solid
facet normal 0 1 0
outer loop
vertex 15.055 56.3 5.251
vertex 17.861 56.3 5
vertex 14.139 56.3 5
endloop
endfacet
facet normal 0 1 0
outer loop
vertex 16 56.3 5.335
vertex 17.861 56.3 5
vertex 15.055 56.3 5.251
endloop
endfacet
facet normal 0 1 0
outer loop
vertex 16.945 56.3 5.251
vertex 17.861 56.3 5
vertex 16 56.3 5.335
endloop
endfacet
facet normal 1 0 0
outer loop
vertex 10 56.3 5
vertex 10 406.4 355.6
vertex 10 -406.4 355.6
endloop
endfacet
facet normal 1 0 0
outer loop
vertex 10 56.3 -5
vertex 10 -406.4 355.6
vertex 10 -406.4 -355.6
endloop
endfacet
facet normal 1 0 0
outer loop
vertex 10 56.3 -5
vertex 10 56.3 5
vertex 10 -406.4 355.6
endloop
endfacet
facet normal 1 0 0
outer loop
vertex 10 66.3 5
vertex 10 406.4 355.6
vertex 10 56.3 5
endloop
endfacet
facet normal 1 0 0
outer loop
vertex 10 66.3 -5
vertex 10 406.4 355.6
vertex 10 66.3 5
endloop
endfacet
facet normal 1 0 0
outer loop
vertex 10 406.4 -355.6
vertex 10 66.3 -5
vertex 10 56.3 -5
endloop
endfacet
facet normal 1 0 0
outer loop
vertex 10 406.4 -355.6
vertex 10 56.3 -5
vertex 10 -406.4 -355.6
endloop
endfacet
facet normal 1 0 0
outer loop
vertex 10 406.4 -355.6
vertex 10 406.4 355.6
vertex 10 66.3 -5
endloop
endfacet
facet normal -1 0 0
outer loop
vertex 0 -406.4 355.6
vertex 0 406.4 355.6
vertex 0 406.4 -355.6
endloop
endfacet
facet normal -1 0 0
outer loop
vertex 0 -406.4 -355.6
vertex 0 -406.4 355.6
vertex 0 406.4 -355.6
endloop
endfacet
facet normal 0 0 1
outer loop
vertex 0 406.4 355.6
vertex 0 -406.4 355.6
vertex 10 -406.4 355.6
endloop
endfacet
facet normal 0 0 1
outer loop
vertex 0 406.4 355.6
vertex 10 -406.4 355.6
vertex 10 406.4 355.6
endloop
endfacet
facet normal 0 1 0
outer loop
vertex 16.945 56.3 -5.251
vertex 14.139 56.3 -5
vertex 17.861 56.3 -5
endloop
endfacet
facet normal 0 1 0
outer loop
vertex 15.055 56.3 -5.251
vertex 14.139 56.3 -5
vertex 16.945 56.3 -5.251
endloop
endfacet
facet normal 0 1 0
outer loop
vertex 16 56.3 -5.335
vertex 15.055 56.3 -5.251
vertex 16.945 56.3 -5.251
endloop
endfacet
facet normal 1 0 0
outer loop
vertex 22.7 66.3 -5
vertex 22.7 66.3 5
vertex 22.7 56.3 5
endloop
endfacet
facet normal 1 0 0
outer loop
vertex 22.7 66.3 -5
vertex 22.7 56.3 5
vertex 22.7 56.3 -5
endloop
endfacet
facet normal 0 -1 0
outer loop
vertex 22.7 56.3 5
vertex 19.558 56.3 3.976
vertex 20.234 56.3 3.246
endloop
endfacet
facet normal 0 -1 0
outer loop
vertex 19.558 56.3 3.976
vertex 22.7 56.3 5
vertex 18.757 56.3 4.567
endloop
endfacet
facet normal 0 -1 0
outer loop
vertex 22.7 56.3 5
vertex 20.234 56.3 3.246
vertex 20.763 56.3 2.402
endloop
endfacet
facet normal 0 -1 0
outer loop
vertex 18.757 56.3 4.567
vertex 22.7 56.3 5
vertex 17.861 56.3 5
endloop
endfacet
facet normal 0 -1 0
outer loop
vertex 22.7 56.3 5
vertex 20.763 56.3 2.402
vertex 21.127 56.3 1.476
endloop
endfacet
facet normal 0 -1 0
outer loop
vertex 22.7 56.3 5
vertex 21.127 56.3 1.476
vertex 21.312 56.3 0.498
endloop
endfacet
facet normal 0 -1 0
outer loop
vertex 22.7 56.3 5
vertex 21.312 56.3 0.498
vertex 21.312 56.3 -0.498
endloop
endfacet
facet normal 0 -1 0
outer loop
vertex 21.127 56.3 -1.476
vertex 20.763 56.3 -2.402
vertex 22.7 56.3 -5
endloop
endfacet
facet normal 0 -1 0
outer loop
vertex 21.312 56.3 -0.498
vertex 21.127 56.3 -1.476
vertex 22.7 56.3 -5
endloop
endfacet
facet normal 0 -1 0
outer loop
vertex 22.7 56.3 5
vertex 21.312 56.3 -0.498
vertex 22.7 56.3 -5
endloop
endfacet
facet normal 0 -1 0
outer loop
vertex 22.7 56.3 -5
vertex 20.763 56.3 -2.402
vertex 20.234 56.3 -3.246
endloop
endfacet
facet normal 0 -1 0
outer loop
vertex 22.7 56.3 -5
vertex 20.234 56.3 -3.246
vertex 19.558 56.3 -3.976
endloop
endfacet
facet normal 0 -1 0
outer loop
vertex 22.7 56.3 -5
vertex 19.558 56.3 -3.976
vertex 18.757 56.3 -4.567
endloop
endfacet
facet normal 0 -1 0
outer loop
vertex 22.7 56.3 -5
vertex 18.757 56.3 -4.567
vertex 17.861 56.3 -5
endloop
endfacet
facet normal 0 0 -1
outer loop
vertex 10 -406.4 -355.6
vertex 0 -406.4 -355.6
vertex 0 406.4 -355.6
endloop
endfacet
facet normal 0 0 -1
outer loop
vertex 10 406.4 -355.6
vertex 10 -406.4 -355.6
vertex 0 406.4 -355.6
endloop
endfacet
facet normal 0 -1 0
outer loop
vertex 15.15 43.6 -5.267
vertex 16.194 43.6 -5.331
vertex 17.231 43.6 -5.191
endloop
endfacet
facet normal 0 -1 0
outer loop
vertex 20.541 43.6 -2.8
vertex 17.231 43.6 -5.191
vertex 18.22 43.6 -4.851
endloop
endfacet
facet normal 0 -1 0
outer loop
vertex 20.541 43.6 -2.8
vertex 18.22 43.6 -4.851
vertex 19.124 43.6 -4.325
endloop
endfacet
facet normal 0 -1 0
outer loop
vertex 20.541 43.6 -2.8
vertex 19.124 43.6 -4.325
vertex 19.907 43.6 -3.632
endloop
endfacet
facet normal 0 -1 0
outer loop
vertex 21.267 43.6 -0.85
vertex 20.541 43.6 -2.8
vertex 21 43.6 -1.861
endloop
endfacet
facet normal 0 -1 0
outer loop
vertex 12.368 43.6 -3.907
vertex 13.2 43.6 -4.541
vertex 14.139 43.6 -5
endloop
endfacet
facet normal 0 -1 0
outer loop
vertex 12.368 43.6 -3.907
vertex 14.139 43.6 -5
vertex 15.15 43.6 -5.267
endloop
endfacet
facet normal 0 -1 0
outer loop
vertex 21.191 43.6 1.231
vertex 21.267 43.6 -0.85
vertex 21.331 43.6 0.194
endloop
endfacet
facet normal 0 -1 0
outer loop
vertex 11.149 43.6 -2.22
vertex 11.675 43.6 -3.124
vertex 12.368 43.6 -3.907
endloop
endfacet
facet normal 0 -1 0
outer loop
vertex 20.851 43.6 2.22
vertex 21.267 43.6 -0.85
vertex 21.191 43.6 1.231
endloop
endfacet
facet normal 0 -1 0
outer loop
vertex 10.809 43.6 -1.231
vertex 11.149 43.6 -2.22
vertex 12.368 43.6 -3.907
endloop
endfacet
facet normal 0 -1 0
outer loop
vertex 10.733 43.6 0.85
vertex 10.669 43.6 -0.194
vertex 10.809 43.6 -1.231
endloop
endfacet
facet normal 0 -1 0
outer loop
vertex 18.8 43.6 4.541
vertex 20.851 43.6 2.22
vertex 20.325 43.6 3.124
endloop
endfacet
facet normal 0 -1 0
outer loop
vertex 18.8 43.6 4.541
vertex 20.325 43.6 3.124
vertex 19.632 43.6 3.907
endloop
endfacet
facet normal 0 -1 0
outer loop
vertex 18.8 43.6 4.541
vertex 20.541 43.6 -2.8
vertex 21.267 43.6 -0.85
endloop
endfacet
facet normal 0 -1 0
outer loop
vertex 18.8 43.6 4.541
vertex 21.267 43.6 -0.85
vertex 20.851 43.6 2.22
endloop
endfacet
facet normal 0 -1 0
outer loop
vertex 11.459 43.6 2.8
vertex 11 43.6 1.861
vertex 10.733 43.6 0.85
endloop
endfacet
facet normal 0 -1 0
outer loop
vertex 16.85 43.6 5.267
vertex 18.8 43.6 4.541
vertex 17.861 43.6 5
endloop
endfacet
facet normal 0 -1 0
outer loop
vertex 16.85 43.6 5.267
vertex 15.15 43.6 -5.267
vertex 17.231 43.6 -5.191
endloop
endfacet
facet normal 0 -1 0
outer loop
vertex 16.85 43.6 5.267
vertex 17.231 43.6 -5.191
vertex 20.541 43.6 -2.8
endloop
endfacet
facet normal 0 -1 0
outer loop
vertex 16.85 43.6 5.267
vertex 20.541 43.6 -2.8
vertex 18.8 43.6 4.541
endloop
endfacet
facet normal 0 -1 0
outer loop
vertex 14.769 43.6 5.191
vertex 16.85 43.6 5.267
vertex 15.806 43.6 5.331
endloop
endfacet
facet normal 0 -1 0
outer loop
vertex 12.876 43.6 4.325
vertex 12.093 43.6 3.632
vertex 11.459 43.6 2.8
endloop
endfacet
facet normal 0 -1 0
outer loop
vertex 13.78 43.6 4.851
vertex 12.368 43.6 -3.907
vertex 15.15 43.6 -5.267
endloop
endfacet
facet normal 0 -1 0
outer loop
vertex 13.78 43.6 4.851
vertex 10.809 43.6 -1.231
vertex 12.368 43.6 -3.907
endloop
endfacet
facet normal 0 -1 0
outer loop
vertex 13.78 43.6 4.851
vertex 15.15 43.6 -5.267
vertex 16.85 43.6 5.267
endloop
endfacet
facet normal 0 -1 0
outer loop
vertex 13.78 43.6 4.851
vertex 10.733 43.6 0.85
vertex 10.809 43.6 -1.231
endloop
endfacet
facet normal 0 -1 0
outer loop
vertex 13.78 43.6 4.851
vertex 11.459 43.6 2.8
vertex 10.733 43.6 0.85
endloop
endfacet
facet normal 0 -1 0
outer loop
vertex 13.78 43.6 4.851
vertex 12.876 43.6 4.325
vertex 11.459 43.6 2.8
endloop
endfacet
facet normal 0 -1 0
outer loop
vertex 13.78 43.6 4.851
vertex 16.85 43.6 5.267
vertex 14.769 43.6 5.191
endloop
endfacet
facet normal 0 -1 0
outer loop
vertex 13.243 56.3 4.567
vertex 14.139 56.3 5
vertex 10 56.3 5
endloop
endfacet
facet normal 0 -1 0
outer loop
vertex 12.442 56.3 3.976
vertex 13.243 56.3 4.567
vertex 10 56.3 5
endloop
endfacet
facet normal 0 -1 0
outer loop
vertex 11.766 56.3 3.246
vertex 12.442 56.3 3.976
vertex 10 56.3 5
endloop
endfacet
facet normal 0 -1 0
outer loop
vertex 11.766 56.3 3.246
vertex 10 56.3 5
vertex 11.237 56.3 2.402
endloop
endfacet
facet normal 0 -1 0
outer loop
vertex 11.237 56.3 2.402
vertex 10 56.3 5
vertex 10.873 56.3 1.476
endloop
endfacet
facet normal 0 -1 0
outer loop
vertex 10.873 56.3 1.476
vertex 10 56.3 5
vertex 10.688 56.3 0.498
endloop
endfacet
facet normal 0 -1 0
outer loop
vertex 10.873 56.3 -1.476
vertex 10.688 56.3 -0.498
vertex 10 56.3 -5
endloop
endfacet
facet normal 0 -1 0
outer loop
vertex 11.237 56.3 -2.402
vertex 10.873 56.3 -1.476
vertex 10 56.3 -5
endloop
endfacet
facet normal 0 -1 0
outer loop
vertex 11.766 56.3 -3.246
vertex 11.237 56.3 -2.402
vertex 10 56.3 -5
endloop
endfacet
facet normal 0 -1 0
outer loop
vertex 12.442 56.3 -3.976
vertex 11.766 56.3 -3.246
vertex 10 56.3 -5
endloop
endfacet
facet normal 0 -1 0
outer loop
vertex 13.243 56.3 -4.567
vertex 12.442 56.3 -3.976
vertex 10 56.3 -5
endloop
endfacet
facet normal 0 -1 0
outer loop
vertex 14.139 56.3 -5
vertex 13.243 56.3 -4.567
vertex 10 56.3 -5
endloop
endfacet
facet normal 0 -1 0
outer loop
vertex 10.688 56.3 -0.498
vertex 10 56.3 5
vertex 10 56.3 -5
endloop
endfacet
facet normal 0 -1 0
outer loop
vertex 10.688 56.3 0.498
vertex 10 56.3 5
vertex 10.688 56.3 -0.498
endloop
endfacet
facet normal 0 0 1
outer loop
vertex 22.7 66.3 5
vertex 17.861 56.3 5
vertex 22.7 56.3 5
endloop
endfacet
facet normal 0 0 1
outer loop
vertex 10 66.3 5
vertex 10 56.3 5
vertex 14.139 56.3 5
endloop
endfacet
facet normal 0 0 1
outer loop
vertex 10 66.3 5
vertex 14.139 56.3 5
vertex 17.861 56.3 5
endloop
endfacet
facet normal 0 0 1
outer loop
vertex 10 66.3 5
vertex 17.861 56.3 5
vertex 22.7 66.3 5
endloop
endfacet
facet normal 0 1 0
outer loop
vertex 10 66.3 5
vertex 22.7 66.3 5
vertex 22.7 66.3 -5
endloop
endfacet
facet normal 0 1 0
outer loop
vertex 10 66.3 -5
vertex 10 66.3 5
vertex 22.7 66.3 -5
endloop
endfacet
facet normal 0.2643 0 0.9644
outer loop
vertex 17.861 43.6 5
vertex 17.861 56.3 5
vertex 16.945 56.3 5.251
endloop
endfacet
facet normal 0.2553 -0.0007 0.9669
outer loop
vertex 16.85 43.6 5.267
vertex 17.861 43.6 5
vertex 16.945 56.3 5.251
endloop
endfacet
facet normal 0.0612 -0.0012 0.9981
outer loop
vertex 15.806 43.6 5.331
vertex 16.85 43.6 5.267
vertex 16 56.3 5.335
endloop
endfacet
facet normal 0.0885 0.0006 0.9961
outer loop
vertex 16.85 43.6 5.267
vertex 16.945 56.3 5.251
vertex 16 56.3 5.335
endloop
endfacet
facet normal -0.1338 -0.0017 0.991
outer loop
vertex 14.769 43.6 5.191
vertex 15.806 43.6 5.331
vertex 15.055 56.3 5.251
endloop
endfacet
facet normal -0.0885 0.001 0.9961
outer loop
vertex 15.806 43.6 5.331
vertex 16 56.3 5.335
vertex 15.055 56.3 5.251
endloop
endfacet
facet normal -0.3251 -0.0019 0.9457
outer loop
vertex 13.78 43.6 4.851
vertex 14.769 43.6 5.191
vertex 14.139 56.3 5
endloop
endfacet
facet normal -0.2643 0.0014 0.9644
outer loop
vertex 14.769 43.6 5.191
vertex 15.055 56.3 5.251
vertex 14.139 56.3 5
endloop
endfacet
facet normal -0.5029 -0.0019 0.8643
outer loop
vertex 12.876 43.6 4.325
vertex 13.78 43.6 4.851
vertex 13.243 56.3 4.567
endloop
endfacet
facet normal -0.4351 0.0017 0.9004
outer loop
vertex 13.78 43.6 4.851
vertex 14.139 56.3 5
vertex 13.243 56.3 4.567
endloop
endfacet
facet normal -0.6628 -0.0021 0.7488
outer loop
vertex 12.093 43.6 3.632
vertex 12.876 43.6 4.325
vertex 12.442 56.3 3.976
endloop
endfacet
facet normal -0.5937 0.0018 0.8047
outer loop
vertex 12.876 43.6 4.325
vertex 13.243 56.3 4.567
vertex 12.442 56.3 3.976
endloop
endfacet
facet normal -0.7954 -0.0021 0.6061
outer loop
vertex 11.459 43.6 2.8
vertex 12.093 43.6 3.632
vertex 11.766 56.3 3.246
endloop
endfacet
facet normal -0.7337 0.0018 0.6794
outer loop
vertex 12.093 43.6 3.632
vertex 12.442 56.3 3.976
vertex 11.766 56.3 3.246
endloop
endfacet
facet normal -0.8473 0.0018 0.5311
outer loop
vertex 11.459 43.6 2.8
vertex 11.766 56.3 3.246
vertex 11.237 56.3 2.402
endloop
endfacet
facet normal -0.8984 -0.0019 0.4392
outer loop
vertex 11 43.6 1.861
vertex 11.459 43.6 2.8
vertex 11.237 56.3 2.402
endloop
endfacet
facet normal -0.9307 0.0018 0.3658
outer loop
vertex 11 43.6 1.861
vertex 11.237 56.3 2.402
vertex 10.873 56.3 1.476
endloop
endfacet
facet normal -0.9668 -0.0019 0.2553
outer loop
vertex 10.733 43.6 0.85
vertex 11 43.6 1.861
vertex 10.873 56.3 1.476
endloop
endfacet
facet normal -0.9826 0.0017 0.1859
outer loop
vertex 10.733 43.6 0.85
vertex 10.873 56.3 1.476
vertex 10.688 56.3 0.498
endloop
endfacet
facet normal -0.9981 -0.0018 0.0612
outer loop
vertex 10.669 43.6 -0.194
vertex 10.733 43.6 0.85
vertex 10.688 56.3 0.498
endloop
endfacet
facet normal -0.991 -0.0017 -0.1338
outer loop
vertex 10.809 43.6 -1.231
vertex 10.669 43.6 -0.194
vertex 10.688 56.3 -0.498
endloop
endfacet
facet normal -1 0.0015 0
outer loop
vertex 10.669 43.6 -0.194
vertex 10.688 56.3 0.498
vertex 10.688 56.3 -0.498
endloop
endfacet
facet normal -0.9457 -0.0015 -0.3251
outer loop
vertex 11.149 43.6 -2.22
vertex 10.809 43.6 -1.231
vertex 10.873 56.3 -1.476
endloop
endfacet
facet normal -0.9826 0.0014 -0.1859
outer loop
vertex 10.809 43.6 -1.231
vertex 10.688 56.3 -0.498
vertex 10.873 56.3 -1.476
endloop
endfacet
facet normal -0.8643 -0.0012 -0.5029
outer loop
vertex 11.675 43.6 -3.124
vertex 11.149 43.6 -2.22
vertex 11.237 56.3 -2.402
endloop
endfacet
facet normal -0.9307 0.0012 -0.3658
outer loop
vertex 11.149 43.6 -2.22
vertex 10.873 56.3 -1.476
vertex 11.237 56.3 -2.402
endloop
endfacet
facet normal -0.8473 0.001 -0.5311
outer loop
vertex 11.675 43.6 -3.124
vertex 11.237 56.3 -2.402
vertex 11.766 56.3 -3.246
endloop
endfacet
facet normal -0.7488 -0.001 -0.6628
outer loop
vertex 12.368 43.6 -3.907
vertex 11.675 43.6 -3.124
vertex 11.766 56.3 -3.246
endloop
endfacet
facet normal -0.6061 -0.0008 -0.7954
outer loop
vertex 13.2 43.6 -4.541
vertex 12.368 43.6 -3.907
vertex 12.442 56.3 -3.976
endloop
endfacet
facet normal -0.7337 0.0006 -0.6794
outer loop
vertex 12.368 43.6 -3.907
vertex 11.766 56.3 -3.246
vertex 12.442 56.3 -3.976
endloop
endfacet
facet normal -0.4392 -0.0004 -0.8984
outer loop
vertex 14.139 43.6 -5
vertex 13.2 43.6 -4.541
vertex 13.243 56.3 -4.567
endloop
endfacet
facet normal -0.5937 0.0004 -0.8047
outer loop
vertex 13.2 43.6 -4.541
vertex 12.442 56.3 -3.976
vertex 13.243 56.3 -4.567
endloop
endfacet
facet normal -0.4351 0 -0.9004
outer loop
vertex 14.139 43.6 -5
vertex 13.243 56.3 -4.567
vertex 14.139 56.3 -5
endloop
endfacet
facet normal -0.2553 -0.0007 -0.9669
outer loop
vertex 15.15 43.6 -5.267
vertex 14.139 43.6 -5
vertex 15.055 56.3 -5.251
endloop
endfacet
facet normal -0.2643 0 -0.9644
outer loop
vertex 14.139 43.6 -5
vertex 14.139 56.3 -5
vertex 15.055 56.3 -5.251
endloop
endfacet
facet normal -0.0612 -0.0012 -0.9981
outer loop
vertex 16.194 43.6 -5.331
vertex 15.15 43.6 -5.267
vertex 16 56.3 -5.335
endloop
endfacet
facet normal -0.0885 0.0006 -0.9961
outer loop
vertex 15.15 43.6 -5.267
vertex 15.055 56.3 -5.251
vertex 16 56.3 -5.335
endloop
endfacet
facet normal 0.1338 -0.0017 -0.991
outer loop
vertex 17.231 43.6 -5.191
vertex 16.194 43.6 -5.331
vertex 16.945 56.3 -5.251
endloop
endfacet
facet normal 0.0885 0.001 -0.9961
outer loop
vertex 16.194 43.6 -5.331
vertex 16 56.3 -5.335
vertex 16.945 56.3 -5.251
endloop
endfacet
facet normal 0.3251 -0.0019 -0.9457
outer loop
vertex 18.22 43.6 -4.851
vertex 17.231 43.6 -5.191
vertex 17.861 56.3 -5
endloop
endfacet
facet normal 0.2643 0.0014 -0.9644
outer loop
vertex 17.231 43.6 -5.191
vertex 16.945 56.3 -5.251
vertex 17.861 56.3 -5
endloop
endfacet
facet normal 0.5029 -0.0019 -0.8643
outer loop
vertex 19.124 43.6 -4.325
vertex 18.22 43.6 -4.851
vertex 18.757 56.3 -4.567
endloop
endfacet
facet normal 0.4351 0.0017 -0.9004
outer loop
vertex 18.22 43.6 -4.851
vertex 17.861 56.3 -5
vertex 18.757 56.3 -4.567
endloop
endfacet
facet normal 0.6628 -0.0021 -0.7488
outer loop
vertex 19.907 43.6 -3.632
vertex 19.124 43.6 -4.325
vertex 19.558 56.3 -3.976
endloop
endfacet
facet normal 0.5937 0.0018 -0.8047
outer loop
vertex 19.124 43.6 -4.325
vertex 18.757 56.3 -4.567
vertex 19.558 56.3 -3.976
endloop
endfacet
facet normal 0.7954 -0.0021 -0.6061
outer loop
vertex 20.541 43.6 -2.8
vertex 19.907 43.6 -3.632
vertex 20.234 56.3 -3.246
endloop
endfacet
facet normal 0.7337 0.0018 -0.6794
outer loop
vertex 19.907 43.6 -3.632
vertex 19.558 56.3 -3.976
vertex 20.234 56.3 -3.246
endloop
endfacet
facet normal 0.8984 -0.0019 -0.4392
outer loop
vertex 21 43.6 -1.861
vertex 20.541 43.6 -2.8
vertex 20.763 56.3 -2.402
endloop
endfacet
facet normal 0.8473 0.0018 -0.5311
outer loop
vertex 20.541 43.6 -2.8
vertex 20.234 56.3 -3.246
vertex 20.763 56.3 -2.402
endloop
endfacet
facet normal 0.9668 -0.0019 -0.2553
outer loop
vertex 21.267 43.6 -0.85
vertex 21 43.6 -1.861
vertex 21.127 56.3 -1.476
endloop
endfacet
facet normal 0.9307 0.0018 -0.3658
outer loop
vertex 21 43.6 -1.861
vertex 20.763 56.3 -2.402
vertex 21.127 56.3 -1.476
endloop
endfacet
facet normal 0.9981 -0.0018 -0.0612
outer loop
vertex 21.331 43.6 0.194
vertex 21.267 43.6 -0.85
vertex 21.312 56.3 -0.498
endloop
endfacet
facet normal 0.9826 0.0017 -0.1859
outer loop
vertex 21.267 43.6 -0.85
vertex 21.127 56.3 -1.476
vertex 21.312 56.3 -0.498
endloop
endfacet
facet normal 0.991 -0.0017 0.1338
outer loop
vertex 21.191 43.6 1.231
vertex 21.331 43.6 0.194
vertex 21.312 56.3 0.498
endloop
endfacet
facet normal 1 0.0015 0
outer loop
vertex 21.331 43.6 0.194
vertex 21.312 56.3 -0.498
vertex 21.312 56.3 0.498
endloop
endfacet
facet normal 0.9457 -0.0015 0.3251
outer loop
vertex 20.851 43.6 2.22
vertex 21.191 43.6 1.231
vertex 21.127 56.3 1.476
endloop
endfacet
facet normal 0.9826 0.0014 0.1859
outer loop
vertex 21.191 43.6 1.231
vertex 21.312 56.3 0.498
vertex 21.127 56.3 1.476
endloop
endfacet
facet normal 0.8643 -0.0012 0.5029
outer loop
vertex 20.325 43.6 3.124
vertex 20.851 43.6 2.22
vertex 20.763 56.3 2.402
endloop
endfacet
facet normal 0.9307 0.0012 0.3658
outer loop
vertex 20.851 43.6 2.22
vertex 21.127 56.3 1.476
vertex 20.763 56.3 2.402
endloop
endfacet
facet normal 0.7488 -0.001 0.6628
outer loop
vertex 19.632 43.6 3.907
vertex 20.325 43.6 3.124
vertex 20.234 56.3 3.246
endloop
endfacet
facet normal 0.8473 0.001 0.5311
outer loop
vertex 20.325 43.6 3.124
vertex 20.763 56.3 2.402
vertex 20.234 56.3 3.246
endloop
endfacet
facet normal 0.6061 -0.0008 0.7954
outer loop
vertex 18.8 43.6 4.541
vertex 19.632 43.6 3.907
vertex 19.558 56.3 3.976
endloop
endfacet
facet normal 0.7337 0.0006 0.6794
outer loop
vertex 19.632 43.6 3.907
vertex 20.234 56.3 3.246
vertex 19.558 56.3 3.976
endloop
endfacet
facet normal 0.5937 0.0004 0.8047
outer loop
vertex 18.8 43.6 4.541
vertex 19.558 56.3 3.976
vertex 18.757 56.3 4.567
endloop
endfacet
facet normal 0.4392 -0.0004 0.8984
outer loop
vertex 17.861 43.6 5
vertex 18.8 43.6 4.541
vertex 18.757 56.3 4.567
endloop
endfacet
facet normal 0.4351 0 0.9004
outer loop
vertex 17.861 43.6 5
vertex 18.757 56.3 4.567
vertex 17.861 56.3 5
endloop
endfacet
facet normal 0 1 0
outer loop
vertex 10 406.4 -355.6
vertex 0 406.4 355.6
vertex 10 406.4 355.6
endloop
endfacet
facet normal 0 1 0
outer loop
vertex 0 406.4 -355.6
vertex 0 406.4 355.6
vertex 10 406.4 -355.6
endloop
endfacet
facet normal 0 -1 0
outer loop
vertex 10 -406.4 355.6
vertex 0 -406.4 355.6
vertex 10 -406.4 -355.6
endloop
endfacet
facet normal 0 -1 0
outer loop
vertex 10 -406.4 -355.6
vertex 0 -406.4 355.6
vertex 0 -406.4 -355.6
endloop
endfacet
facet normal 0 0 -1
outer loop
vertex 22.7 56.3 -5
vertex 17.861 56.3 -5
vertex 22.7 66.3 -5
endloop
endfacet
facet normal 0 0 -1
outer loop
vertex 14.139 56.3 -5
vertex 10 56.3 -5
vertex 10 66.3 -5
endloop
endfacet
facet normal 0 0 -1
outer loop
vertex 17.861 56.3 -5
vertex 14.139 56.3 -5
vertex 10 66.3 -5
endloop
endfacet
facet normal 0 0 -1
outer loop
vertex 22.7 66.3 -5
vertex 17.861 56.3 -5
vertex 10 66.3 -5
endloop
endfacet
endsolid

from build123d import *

# Parameters (mm, degrees)
SKETCH1_W           = 711.2
SKETCH1_H           = 812.8
BOSS_EXTRUDE1_DEPTH = 10
SKETCH2_W           = 10
SKETCH2_H           = 10
BOSS_EXTRUDE2_DEPTH = 12.7
SKETCH4_R           = 5.335
BOSS_EXTRUDE5_DEPTH = 12.7


with BuildPart() as part:
    # Sketch1 → Boss-Extrude1 (new body)
    with BuildSketch(Plane(origin=(0, 0, 0), x_dir=(0, 0, -1), z_dir=(1, 0, 0))):
        Rectangle(SKETCH1_W, SKETCH1_H)
    extrude(amount=BOSS_EXTRUDE1_DEPTH)

    # Sketch2 → Boss-Extrude2 (add)
    with BuildSketch(Plane(origin=(10, 0, 0), x_dir=(0, 0, -1), z_dir=(1, 0, 0))):
        with Locations((0, 61.3)):
            Rectangle(SKETCH2_W, SKETCH2_H)
    extrude(amount=BOSS_EXTRUDE2_DEPTH)

    # Sketch4 → Boss-Extrude5 (add)
    with BuildSketch(Plane.XZ.offset(-56.3)):
        with Locations(Location((16, 0, 0), (0, 0, 69.587697496))):
            Circle(SKETCH4_R)
    extrude(amount=BOSS_EXTRUDE5_DEPTH)


solid = part.part
